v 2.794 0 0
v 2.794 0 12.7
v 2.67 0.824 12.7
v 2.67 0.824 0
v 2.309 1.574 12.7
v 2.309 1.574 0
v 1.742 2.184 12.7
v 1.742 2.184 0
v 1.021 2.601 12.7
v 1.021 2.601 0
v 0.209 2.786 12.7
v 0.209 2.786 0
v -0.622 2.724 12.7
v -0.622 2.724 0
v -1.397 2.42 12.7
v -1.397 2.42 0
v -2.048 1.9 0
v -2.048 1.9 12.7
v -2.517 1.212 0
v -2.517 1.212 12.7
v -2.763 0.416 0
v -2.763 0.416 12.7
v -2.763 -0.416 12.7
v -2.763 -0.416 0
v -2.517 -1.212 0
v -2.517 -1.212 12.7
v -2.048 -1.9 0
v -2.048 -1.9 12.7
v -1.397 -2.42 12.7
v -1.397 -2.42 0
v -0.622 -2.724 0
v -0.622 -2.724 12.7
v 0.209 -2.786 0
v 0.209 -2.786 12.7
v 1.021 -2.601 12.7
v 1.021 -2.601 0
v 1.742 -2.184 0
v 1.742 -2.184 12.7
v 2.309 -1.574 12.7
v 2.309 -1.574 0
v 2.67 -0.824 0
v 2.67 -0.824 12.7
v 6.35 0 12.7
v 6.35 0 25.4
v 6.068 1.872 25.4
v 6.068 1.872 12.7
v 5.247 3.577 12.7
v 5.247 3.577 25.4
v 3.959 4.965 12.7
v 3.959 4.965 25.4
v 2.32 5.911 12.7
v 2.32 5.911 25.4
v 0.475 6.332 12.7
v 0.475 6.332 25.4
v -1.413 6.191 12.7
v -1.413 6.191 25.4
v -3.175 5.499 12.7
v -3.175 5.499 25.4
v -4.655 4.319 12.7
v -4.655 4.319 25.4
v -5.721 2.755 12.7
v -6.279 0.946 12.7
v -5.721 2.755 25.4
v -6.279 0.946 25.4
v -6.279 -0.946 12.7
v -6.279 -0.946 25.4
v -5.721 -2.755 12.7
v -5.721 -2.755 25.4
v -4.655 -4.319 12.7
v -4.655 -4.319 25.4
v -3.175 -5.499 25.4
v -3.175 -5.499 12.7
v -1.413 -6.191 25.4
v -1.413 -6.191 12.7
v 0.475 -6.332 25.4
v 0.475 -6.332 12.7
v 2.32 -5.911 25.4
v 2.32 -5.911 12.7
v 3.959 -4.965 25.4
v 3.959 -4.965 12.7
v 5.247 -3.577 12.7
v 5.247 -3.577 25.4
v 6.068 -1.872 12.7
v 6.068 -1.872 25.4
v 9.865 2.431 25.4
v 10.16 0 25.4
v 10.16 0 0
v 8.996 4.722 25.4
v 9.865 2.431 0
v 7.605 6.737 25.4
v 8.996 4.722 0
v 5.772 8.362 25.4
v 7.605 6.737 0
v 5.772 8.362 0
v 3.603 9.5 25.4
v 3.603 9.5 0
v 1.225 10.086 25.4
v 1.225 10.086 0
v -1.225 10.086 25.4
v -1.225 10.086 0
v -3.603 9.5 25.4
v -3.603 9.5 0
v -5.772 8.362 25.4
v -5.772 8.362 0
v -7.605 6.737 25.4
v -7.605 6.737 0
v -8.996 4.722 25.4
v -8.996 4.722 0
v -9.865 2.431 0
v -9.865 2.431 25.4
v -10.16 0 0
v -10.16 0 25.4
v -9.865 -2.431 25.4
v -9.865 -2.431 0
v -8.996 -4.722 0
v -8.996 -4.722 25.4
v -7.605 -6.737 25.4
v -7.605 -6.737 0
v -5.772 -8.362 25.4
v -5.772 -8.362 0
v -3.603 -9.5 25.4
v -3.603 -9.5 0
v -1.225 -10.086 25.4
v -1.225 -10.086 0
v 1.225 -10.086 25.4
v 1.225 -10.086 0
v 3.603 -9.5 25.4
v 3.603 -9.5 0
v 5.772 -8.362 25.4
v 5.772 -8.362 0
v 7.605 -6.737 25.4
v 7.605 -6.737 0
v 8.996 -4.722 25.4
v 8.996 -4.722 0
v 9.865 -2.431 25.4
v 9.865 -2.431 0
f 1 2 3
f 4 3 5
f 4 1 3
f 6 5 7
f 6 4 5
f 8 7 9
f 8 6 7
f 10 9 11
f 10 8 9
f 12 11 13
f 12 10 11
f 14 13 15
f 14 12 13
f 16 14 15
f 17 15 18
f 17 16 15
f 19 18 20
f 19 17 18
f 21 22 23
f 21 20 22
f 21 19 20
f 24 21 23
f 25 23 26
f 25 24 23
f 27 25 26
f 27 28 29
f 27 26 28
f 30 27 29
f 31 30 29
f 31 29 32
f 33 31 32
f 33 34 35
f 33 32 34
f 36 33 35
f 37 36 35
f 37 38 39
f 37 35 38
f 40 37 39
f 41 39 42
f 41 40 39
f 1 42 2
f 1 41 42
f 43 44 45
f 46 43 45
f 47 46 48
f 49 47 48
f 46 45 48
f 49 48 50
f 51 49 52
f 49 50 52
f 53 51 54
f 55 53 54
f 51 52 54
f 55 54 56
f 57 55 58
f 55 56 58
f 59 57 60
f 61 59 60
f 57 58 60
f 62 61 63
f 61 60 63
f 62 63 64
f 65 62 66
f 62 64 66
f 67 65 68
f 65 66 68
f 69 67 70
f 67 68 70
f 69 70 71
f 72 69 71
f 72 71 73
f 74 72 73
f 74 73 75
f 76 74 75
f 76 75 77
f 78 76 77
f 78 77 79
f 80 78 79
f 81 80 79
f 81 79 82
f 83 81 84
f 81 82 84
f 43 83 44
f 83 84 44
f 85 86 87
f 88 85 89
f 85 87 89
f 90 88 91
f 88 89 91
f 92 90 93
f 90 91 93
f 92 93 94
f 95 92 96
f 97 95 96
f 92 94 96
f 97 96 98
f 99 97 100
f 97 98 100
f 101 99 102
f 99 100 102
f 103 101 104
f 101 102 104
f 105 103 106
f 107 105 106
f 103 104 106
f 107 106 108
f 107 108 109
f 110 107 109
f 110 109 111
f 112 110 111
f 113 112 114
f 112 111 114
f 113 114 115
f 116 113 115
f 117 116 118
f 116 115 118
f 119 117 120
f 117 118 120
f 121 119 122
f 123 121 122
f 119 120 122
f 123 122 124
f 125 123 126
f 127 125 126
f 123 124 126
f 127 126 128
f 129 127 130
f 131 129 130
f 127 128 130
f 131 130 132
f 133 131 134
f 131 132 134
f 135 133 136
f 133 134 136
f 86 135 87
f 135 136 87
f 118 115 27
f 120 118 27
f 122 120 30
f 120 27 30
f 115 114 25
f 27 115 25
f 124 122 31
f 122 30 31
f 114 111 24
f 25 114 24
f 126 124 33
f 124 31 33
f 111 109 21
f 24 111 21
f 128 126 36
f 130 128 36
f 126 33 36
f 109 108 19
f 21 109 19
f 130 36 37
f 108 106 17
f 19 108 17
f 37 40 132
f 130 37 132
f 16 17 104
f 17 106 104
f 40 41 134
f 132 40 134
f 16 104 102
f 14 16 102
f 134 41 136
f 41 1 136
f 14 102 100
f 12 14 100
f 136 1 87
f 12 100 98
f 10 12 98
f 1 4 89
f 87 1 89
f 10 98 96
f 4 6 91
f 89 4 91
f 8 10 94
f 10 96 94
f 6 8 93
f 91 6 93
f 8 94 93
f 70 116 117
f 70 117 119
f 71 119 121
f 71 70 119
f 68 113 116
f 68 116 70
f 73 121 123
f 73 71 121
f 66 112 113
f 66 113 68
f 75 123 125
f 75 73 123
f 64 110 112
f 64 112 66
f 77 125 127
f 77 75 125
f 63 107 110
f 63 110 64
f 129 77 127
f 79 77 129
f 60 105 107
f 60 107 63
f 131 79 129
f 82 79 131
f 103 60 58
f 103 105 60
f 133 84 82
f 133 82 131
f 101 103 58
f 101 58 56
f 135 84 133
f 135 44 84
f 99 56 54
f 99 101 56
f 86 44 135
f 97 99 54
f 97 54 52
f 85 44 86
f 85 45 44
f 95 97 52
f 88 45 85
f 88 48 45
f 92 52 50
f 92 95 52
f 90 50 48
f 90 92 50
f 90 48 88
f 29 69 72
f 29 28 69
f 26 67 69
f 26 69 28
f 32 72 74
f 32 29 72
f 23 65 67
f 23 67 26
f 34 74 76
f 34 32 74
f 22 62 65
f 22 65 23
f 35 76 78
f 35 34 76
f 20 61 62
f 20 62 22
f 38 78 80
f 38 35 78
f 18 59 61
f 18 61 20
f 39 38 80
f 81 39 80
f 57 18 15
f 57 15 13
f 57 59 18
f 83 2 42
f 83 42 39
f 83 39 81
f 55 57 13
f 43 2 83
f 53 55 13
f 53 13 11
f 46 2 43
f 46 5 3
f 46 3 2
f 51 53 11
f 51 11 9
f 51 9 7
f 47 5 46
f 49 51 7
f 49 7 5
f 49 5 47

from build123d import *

# Parameters (mm, degrees)
F0_R     = 10.16
F1_DEPTH = 25.4
F2_R     = 2.794
F3_DEPTH = 76.2
F4_R     = 6.35
F5_DEPTH = 12.7


with BuildPart() as f1:
    # F0 (on Top) → F1 (new body)
    with BuildSketch(Plane.XY):
        Circle(F0_R)
    extrude(amount=F1_DEPTH)

    # F2 (on face) → F3 (cut)
    with BuildSketch(Plane.XY):
        Circle(F2_R)
    extrude(amount=F3_DEPTH, mode=Mode.SUBTRACT)

    # F4 (on face) → F5 (cut)
    with BuildSketch(Plane.XY.offset(25.4)):
        Circle(F4_R)
    extrude(amount=-F5_DEPTH, mode=Mode.SUBTRACT)


solid = f1.part
